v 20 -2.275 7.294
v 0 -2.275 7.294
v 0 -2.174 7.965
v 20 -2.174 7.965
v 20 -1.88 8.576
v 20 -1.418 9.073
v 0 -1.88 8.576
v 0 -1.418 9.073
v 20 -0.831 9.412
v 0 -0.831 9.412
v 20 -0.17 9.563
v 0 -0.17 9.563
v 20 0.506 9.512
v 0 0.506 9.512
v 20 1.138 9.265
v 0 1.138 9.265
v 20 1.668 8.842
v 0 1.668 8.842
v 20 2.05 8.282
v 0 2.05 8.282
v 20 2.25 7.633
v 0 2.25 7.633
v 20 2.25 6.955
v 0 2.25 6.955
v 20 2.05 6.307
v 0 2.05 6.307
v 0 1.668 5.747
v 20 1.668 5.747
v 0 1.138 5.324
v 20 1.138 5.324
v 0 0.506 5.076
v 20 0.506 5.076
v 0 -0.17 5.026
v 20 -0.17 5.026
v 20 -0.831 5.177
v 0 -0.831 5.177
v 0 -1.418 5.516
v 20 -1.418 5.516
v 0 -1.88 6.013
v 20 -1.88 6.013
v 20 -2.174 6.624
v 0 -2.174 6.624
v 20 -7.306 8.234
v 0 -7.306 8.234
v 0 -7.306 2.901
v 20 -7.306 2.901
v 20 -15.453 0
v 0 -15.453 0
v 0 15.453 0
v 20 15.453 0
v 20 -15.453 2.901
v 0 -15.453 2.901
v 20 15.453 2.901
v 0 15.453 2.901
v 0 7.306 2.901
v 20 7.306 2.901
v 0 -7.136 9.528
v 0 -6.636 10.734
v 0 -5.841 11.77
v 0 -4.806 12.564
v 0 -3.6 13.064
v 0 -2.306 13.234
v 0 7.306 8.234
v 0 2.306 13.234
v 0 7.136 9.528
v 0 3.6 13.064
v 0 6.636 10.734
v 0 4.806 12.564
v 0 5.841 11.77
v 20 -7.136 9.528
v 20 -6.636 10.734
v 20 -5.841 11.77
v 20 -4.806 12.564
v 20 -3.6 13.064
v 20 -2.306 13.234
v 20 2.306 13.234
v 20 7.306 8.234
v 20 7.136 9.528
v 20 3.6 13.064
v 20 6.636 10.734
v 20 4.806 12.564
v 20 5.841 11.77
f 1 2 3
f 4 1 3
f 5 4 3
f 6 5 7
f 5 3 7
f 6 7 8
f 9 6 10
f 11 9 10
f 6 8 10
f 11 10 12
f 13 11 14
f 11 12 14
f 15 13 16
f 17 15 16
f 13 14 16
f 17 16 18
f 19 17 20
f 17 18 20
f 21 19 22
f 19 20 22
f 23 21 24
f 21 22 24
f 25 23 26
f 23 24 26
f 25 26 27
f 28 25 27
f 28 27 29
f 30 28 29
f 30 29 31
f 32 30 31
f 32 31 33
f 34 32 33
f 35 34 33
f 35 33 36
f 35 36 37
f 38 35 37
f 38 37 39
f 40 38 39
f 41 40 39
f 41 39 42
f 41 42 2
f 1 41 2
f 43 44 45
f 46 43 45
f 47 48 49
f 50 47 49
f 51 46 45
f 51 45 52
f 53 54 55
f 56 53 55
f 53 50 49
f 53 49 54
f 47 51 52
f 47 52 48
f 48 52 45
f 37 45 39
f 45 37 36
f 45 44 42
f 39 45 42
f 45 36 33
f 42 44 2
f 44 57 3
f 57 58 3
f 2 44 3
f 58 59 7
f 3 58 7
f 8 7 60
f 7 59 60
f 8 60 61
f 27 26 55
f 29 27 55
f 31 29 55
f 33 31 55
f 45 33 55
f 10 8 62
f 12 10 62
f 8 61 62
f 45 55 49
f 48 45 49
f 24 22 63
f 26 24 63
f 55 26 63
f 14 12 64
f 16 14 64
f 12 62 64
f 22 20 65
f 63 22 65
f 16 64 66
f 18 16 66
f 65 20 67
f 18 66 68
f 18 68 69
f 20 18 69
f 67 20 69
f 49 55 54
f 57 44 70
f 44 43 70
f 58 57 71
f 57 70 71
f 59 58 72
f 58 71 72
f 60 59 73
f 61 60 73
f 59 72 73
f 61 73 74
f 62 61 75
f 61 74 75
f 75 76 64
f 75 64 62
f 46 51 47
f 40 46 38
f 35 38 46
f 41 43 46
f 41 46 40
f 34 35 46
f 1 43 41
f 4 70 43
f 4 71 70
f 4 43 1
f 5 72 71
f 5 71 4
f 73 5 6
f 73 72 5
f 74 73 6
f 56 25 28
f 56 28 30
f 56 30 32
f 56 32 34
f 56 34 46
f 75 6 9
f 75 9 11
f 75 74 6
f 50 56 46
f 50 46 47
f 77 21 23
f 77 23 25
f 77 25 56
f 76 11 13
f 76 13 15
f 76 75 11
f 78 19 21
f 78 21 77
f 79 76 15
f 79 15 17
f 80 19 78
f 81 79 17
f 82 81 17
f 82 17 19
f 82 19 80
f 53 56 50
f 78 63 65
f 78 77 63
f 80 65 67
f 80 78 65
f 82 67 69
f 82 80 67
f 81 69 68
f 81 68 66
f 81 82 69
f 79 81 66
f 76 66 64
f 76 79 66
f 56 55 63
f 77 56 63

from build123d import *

# Parameters (mm, degrees)
F1_DEPTH = 20
F3_D     = 4.55
F4_R     = 5


with BuildPart() as f1:
    # F0 (on Right) → F1 (new body)
    with BuildSketch(Plane.YZ):
        Polygon((-15.453118, 0), (0, 0), (0, 13.234019), (-7.305924, 13.234019), (-7.305924, 2.900996), (-15.453118, 2.900996), align=None)
        Polygon((0, 13.234019), (0, 0), (15.453118, 0), (15.453118, 2.900996), (7.305924, 2.900996), (7.305924, 13.234019), align=None)
    extrude(amount=F1_DEPTH)

    # F3 (through all)
    with Locations(Plane.YZ.offset(20)):
        with Locations((0, 7.294424)):
            Hole(F3_D / 2)

    # F4
    f4_edges = [f1.edges().sort_by_distance(p)[0] for p in [
        (10, 7.305924, 13.234019),
        (10, -7.305924, 13.234019),
    ]]
    fillet(f4_edges, radius=F4_R)


solid = f1.part
